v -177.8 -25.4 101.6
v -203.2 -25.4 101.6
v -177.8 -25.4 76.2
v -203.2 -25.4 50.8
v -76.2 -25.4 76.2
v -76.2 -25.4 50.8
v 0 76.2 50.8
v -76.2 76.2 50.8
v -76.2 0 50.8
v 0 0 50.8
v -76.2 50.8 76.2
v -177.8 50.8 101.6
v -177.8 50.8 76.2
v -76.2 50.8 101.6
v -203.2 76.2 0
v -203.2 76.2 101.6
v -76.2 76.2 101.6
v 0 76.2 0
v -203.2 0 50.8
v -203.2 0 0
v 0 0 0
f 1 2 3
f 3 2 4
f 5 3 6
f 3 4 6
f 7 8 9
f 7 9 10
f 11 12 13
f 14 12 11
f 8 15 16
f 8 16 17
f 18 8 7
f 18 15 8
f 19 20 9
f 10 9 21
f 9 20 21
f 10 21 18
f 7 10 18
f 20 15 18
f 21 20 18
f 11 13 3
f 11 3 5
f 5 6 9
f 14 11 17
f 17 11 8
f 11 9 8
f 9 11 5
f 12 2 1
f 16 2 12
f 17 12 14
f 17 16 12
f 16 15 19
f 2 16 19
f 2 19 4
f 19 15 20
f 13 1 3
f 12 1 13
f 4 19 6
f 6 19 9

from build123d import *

# Parameters (mm, degrees)
F0_W     = 203.2
F0_H     = 76.2
F1_DEPTH = 50.8
F2_W     = 127
F2_H     = 76.2
F2_H_2   = 25.4
F3_DEPTH = 50.8
F4_W     = 101.6
F4_H     = 76.2
F5_DEPTH = 25.4
F6_ANGLE = 90


with BuildPart() as f1:
    # F0 (on Front) → F1 (new body)
    with BuildSketch(Plane.XZ):
        with Locations((-101.6, 38.1)):
            Rectangle(F0_W, F0_H)
    extrude(amount=F1_DEPTH)

    # F2 (on face) → F3 (join)
    with BuildSketch(Plane.XZ.offset(50.8)):
        with Locations((-139.7, 38.1)):
            Rectangle(F2_W, F2_H)
        with Locations((-139.7, -12.7)):
            Rectangle(F2_W, F2_H_2)
    extrude(amount=F3_DEPTH)

    # F4 (on face) → F5 (cut)
    with BuildSketch(Plane.XZ.offset(101.6)):
        with Locations((-127, 12.7)):
            Rectangle(F4_W, F4_H)
    extrude(amount=-F5_DEPTH, mode=Mode.SUBTRACT)


with BuildPart() as f1_1:
    # F6: moved
    add(f1.part.rotate(Axis((-101.6, 0, 0), (-1, 0, 0)), F6_ANGLE))


solid = f1_1.part
